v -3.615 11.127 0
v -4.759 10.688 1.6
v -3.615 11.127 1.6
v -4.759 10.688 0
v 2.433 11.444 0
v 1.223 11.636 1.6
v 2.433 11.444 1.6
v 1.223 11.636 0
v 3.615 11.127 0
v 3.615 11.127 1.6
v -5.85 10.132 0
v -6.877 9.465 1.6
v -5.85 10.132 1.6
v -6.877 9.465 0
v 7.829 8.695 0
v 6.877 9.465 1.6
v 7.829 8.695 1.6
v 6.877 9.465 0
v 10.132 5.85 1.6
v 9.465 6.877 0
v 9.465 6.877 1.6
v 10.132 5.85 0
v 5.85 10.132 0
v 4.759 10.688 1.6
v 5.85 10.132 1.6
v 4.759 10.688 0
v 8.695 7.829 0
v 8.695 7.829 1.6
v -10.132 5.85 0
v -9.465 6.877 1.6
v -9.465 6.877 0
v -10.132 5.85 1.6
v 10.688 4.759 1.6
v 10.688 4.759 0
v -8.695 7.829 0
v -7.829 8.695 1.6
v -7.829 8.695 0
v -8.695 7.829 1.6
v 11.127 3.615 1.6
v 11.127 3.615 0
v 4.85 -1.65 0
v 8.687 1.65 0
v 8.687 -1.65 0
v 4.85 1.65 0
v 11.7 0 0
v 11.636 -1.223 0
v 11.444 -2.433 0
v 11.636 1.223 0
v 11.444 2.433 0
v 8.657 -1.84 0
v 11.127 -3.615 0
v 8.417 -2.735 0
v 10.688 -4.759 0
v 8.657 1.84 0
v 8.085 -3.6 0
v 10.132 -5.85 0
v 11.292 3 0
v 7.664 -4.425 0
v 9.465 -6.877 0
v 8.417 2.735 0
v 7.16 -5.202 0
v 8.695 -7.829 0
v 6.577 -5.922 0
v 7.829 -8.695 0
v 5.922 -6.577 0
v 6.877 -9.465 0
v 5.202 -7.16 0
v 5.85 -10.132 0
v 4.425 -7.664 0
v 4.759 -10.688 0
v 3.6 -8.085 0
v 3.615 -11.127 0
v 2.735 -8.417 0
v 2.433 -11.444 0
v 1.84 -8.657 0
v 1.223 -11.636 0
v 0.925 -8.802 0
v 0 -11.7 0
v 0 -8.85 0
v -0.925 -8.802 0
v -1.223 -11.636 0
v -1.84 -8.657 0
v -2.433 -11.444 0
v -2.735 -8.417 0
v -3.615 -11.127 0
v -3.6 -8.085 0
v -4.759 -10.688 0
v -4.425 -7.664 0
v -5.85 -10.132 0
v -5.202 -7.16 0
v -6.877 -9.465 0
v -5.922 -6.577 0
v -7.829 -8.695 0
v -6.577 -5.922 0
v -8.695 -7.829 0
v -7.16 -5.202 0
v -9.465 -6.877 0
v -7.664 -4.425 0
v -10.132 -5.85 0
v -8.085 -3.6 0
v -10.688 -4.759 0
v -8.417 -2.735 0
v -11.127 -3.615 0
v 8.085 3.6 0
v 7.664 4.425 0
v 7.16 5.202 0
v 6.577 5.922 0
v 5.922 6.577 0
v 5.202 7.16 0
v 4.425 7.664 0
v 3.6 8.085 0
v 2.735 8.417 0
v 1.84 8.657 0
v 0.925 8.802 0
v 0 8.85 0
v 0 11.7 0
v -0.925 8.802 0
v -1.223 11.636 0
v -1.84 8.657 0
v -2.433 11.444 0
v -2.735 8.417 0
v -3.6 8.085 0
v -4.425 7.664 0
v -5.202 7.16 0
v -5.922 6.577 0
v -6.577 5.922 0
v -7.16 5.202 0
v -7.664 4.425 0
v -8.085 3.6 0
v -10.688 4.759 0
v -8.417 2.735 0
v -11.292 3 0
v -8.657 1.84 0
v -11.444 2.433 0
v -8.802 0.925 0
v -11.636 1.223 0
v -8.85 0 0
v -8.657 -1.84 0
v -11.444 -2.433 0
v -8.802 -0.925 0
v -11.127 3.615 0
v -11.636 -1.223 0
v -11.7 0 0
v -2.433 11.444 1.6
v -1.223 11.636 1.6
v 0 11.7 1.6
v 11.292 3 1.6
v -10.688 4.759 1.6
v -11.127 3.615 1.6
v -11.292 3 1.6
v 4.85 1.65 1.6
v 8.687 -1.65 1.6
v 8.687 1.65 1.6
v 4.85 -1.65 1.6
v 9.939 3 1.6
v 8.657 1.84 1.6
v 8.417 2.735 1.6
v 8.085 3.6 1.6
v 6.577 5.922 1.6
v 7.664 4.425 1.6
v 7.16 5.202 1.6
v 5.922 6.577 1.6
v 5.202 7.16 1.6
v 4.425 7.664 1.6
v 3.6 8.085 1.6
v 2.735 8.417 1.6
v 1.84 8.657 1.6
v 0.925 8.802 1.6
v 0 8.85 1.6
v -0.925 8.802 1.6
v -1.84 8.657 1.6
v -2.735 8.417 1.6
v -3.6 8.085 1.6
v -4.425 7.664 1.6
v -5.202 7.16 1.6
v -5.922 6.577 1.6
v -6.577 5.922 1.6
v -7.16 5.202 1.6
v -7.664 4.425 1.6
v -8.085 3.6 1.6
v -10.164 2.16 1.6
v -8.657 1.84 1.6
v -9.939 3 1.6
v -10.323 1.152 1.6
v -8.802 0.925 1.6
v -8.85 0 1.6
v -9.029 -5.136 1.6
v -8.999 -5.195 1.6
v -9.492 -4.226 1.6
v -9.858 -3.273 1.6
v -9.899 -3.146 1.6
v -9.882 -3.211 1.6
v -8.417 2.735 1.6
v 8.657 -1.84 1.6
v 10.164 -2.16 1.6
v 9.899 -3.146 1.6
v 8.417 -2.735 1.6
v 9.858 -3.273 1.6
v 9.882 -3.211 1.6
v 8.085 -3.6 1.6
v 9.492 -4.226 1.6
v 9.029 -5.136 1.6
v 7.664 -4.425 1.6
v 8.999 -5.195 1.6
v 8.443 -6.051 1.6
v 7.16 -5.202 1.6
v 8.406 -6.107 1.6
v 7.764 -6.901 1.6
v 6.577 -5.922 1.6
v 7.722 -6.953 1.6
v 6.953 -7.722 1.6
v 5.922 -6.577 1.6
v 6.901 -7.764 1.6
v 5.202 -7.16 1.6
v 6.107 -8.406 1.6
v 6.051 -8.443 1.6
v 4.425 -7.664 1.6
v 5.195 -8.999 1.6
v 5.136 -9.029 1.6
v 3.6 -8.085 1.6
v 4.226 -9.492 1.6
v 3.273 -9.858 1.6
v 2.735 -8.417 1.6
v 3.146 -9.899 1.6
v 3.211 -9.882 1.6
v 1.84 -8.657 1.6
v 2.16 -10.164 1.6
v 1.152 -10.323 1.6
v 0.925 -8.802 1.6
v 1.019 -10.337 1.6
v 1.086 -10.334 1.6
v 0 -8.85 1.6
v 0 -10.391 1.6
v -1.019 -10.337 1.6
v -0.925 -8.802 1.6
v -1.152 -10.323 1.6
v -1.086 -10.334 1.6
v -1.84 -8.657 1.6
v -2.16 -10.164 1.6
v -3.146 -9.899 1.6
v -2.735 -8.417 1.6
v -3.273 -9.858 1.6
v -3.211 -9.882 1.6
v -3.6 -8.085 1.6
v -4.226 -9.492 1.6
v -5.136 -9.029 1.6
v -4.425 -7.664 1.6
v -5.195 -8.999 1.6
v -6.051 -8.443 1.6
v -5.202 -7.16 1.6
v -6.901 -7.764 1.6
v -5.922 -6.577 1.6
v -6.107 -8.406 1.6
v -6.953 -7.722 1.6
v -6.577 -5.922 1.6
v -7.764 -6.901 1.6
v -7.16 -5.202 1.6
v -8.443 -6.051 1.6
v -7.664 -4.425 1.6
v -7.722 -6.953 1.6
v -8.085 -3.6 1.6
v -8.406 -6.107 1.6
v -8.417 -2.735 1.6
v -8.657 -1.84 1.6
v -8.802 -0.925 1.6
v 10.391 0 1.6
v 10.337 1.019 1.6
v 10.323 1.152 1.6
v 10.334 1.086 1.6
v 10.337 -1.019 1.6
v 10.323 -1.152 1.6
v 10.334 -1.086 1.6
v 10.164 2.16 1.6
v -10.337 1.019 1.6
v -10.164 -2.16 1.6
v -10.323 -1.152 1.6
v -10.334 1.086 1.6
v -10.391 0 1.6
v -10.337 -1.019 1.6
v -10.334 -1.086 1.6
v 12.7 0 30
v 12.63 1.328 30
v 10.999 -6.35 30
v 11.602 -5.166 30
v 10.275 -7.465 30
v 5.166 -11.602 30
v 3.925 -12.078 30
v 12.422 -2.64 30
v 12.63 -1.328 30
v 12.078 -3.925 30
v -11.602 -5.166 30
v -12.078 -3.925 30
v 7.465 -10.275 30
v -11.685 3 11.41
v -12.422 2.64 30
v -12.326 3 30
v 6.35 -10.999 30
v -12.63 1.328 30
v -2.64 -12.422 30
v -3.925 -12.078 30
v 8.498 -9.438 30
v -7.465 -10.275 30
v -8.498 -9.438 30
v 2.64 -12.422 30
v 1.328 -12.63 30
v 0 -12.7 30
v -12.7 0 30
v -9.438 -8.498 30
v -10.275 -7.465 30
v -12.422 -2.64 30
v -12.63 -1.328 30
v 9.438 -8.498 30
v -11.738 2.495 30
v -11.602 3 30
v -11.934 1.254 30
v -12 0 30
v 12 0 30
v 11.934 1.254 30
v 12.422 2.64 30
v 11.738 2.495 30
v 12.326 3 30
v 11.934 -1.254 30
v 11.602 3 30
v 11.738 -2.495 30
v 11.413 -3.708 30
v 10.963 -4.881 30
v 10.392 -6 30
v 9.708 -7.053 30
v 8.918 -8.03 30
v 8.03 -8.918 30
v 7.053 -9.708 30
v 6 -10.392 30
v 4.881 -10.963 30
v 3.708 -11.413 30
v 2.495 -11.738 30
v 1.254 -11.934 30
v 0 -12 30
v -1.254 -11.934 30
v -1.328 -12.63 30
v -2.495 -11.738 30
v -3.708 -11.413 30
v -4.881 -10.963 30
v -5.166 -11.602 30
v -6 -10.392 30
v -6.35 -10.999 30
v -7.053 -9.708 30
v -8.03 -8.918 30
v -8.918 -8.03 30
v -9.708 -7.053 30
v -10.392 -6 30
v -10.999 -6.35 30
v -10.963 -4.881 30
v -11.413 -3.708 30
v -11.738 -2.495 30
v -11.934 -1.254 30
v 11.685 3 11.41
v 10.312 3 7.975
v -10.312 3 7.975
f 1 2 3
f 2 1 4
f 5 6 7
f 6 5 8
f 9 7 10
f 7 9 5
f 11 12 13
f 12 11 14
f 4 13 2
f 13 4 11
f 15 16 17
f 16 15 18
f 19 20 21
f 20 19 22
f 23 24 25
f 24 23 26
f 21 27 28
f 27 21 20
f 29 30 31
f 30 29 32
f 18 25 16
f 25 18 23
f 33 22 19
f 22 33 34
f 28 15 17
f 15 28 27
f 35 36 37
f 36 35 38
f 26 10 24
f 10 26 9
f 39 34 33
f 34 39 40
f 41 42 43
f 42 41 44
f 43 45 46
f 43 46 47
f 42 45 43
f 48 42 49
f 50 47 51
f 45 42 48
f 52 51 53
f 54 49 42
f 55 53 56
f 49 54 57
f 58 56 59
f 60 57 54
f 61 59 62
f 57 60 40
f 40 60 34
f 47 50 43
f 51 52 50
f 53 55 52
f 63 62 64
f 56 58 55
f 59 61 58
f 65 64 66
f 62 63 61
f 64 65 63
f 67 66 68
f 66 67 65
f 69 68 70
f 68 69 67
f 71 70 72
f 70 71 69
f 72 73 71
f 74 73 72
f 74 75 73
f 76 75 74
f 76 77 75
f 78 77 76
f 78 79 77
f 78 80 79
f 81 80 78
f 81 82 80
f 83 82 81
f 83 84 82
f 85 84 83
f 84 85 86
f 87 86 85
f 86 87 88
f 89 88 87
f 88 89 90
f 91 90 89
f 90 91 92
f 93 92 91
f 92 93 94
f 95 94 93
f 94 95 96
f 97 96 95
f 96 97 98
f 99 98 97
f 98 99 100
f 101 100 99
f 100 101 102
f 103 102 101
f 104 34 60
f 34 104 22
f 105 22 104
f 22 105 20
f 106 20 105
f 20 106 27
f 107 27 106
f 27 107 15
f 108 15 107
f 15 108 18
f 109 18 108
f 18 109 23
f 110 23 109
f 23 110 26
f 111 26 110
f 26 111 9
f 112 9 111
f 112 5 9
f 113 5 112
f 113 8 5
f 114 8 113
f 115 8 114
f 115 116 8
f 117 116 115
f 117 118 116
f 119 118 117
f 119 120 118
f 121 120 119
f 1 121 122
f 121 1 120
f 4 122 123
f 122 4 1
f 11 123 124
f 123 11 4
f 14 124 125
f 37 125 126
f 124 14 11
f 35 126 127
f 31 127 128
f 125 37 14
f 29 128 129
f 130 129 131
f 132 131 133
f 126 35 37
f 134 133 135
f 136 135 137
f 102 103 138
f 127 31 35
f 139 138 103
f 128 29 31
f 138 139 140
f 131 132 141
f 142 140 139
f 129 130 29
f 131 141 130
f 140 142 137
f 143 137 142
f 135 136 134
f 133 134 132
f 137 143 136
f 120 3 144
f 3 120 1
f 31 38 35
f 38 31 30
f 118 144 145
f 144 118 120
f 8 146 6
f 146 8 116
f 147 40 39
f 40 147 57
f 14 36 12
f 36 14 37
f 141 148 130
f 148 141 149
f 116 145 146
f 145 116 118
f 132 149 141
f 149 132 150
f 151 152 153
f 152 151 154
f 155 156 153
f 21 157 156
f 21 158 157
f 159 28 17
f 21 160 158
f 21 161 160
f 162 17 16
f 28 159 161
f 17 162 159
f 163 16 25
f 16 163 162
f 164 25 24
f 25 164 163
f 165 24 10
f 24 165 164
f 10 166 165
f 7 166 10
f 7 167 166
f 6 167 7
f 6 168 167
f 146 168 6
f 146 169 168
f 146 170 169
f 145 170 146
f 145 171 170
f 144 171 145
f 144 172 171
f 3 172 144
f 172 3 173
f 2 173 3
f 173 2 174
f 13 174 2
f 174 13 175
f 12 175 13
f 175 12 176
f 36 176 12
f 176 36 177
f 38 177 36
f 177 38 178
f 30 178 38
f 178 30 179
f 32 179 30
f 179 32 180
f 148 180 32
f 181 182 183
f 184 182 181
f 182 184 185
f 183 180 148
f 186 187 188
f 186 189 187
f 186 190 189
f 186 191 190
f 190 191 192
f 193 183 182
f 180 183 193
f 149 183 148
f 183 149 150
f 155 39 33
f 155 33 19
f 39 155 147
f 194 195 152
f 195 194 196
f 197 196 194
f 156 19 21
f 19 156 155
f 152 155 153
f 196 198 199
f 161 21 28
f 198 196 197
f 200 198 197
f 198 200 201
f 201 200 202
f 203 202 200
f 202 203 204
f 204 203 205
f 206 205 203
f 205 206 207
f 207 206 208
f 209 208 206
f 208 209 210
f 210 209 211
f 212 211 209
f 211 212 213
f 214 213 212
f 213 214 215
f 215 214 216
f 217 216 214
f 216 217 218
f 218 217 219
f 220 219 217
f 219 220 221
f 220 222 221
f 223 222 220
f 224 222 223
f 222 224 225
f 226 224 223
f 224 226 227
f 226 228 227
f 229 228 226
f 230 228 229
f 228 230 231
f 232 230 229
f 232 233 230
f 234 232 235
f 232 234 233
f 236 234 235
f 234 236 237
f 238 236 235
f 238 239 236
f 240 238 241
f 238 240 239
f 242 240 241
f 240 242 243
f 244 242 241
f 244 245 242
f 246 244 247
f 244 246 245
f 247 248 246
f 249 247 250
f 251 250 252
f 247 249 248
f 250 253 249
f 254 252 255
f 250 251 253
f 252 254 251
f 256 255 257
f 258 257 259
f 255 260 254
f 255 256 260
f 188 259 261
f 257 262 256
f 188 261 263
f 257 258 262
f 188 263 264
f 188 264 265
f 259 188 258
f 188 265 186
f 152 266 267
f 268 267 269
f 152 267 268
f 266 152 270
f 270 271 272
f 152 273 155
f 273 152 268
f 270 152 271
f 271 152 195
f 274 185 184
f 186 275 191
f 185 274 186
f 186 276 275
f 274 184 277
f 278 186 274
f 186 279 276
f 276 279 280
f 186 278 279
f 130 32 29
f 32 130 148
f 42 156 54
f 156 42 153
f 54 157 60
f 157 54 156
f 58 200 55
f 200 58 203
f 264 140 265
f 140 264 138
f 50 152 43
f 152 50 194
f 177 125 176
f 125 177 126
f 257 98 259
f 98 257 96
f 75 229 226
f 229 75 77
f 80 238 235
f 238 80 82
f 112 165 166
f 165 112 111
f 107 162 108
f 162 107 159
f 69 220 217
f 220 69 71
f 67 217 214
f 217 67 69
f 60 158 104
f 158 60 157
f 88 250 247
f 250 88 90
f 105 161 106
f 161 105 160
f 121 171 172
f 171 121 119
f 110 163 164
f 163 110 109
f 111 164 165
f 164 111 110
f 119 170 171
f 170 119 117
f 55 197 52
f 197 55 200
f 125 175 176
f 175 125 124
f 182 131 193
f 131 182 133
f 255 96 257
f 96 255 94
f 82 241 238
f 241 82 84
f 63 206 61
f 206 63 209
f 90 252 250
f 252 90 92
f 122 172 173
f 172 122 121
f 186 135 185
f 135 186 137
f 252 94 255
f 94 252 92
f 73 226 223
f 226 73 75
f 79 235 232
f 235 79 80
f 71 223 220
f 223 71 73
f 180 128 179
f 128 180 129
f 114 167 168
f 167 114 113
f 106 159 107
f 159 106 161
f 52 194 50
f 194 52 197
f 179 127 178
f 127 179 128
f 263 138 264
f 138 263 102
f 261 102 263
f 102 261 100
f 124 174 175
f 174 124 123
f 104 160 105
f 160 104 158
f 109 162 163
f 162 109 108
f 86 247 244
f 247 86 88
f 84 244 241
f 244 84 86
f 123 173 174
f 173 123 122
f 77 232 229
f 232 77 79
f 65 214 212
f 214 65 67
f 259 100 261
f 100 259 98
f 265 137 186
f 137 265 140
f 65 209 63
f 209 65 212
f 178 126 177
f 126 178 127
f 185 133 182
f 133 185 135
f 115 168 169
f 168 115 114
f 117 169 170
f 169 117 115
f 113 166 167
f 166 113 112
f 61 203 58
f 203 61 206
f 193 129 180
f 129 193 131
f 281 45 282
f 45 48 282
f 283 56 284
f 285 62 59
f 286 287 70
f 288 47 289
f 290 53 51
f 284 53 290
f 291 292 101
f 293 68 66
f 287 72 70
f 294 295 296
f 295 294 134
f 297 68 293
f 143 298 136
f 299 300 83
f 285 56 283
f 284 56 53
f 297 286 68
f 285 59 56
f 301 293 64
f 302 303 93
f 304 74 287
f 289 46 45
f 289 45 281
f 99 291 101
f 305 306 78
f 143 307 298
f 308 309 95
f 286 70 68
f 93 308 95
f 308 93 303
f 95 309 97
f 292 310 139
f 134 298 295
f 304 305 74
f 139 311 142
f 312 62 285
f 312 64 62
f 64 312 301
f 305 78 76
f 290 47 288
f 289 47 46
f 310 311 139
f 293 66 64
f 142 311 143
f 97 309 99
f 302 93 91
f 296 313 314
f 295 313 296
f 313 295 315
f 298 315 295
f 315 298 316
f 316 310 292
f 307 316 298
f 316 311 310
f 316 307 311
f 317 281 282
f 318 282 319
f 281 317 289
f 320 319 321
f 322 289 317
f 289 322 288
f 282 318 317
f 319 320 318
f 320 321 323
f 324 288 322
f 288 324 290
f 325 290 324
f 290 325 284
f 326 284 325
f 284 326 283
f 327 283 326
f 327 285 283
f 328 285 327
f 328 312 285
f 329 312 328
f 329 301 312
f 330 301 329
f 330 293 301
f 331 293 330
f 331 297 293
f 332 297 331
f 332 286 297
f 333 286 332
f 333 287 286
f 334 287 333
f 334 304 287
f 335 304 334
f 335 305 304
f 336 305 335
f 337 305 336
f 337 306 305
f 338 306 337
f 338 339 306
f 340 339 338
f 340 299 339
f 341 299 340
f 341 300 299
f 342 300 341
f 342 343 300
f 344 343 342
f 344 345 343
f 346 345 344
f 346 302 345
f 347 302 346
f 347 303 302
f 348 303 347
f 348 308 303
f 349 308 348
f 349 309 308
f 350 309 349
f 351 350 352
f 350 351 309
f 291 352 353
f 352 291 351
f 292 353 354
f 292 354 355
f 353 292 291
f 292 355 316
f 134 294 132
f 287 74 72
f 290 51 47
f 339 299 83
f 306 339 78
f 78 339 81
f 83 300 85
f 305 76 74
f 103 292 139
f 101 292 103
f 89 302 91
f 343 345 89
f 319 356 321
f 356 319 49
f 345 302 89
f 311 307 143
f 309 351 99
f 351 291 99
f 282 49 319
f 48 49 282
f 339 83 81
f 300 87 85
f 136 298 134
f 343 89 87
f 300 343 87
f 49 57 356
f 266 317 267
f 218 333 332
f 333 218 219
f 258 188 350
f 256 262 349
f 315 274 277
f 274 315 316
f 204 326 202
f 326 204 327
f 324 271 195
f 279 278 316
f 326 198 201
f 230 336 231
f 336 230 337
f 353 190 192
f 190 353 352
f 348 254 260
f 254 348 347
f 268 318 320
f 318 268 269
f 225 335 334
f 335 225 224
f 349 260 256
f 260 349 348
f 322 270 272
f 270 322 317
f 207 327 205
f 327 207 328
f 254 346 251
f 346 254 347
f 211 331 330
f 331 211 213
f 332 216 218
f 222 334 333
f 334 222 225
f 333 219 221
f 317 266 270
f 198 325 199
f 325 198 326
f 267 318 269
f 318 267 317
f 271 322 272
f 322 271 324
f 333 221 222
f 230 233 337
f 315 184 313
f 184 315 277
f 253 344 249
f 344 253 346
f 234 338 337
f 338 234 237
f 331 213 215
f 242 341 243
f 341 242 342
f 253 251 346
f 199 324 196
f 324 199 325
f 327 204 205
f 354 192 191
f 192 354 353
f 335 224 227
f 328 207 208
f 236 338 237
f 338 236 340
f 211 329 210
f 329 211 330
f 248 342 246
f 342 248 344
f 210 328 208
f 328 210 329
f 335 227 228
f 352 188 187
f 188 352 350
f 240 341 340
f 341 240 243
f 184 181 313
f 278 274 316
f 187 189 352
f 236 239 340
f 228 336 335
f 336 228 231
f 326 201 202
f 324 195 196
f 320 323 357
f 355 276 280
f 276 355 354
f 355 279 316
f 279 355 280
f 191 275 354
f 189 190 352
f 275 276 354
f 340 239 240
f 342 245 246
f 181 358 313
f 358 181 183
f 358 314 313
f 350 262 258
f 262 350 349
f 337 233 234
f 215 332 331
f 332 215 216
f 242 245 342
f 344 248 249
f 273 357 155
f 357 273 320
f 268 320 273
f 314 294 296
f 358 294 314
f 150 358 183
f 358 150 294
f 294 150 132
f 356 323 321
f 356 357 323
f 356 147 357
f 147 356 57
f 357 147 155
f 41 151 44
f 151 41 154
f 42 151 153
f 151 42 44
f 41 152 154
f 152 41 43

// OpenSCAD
//height ring
h1=1.6;  
//height protector
h2=30;   
//inner diameter ring
d1=17.7; 
//outer diameter ring
d2=23.4;
//thickness cylinder
x=1.4;  
//gradient of conus (upper side is slightly wider)
c=1.0; 
//x-dimension of nipple
a=4.0;   
//y-dimension of nipple
b=3.3; 


// Ring
difference() {
	cylinder(h1,d2/2,d2/2, $fn=60 );
	rotate ([0,0,0]) cylinder(h1,d1/2,d1/2,$fn=60 );
}
//Nipple
translate([d1/2-a,-b/2,0])  cube([a,b,h1]);   //change x-transformation  for left/right

//protector-cylinder
difference() {
	cylinder(h2,d2/2,d2/2+c, $fn=60 );
	rotate ([0,0,0]) cylinder(h2,d2/2-x,d2/2+c-x/2, $fn=60 );
    translate([-50,+3,0])  cube([100,100,100]);
}
